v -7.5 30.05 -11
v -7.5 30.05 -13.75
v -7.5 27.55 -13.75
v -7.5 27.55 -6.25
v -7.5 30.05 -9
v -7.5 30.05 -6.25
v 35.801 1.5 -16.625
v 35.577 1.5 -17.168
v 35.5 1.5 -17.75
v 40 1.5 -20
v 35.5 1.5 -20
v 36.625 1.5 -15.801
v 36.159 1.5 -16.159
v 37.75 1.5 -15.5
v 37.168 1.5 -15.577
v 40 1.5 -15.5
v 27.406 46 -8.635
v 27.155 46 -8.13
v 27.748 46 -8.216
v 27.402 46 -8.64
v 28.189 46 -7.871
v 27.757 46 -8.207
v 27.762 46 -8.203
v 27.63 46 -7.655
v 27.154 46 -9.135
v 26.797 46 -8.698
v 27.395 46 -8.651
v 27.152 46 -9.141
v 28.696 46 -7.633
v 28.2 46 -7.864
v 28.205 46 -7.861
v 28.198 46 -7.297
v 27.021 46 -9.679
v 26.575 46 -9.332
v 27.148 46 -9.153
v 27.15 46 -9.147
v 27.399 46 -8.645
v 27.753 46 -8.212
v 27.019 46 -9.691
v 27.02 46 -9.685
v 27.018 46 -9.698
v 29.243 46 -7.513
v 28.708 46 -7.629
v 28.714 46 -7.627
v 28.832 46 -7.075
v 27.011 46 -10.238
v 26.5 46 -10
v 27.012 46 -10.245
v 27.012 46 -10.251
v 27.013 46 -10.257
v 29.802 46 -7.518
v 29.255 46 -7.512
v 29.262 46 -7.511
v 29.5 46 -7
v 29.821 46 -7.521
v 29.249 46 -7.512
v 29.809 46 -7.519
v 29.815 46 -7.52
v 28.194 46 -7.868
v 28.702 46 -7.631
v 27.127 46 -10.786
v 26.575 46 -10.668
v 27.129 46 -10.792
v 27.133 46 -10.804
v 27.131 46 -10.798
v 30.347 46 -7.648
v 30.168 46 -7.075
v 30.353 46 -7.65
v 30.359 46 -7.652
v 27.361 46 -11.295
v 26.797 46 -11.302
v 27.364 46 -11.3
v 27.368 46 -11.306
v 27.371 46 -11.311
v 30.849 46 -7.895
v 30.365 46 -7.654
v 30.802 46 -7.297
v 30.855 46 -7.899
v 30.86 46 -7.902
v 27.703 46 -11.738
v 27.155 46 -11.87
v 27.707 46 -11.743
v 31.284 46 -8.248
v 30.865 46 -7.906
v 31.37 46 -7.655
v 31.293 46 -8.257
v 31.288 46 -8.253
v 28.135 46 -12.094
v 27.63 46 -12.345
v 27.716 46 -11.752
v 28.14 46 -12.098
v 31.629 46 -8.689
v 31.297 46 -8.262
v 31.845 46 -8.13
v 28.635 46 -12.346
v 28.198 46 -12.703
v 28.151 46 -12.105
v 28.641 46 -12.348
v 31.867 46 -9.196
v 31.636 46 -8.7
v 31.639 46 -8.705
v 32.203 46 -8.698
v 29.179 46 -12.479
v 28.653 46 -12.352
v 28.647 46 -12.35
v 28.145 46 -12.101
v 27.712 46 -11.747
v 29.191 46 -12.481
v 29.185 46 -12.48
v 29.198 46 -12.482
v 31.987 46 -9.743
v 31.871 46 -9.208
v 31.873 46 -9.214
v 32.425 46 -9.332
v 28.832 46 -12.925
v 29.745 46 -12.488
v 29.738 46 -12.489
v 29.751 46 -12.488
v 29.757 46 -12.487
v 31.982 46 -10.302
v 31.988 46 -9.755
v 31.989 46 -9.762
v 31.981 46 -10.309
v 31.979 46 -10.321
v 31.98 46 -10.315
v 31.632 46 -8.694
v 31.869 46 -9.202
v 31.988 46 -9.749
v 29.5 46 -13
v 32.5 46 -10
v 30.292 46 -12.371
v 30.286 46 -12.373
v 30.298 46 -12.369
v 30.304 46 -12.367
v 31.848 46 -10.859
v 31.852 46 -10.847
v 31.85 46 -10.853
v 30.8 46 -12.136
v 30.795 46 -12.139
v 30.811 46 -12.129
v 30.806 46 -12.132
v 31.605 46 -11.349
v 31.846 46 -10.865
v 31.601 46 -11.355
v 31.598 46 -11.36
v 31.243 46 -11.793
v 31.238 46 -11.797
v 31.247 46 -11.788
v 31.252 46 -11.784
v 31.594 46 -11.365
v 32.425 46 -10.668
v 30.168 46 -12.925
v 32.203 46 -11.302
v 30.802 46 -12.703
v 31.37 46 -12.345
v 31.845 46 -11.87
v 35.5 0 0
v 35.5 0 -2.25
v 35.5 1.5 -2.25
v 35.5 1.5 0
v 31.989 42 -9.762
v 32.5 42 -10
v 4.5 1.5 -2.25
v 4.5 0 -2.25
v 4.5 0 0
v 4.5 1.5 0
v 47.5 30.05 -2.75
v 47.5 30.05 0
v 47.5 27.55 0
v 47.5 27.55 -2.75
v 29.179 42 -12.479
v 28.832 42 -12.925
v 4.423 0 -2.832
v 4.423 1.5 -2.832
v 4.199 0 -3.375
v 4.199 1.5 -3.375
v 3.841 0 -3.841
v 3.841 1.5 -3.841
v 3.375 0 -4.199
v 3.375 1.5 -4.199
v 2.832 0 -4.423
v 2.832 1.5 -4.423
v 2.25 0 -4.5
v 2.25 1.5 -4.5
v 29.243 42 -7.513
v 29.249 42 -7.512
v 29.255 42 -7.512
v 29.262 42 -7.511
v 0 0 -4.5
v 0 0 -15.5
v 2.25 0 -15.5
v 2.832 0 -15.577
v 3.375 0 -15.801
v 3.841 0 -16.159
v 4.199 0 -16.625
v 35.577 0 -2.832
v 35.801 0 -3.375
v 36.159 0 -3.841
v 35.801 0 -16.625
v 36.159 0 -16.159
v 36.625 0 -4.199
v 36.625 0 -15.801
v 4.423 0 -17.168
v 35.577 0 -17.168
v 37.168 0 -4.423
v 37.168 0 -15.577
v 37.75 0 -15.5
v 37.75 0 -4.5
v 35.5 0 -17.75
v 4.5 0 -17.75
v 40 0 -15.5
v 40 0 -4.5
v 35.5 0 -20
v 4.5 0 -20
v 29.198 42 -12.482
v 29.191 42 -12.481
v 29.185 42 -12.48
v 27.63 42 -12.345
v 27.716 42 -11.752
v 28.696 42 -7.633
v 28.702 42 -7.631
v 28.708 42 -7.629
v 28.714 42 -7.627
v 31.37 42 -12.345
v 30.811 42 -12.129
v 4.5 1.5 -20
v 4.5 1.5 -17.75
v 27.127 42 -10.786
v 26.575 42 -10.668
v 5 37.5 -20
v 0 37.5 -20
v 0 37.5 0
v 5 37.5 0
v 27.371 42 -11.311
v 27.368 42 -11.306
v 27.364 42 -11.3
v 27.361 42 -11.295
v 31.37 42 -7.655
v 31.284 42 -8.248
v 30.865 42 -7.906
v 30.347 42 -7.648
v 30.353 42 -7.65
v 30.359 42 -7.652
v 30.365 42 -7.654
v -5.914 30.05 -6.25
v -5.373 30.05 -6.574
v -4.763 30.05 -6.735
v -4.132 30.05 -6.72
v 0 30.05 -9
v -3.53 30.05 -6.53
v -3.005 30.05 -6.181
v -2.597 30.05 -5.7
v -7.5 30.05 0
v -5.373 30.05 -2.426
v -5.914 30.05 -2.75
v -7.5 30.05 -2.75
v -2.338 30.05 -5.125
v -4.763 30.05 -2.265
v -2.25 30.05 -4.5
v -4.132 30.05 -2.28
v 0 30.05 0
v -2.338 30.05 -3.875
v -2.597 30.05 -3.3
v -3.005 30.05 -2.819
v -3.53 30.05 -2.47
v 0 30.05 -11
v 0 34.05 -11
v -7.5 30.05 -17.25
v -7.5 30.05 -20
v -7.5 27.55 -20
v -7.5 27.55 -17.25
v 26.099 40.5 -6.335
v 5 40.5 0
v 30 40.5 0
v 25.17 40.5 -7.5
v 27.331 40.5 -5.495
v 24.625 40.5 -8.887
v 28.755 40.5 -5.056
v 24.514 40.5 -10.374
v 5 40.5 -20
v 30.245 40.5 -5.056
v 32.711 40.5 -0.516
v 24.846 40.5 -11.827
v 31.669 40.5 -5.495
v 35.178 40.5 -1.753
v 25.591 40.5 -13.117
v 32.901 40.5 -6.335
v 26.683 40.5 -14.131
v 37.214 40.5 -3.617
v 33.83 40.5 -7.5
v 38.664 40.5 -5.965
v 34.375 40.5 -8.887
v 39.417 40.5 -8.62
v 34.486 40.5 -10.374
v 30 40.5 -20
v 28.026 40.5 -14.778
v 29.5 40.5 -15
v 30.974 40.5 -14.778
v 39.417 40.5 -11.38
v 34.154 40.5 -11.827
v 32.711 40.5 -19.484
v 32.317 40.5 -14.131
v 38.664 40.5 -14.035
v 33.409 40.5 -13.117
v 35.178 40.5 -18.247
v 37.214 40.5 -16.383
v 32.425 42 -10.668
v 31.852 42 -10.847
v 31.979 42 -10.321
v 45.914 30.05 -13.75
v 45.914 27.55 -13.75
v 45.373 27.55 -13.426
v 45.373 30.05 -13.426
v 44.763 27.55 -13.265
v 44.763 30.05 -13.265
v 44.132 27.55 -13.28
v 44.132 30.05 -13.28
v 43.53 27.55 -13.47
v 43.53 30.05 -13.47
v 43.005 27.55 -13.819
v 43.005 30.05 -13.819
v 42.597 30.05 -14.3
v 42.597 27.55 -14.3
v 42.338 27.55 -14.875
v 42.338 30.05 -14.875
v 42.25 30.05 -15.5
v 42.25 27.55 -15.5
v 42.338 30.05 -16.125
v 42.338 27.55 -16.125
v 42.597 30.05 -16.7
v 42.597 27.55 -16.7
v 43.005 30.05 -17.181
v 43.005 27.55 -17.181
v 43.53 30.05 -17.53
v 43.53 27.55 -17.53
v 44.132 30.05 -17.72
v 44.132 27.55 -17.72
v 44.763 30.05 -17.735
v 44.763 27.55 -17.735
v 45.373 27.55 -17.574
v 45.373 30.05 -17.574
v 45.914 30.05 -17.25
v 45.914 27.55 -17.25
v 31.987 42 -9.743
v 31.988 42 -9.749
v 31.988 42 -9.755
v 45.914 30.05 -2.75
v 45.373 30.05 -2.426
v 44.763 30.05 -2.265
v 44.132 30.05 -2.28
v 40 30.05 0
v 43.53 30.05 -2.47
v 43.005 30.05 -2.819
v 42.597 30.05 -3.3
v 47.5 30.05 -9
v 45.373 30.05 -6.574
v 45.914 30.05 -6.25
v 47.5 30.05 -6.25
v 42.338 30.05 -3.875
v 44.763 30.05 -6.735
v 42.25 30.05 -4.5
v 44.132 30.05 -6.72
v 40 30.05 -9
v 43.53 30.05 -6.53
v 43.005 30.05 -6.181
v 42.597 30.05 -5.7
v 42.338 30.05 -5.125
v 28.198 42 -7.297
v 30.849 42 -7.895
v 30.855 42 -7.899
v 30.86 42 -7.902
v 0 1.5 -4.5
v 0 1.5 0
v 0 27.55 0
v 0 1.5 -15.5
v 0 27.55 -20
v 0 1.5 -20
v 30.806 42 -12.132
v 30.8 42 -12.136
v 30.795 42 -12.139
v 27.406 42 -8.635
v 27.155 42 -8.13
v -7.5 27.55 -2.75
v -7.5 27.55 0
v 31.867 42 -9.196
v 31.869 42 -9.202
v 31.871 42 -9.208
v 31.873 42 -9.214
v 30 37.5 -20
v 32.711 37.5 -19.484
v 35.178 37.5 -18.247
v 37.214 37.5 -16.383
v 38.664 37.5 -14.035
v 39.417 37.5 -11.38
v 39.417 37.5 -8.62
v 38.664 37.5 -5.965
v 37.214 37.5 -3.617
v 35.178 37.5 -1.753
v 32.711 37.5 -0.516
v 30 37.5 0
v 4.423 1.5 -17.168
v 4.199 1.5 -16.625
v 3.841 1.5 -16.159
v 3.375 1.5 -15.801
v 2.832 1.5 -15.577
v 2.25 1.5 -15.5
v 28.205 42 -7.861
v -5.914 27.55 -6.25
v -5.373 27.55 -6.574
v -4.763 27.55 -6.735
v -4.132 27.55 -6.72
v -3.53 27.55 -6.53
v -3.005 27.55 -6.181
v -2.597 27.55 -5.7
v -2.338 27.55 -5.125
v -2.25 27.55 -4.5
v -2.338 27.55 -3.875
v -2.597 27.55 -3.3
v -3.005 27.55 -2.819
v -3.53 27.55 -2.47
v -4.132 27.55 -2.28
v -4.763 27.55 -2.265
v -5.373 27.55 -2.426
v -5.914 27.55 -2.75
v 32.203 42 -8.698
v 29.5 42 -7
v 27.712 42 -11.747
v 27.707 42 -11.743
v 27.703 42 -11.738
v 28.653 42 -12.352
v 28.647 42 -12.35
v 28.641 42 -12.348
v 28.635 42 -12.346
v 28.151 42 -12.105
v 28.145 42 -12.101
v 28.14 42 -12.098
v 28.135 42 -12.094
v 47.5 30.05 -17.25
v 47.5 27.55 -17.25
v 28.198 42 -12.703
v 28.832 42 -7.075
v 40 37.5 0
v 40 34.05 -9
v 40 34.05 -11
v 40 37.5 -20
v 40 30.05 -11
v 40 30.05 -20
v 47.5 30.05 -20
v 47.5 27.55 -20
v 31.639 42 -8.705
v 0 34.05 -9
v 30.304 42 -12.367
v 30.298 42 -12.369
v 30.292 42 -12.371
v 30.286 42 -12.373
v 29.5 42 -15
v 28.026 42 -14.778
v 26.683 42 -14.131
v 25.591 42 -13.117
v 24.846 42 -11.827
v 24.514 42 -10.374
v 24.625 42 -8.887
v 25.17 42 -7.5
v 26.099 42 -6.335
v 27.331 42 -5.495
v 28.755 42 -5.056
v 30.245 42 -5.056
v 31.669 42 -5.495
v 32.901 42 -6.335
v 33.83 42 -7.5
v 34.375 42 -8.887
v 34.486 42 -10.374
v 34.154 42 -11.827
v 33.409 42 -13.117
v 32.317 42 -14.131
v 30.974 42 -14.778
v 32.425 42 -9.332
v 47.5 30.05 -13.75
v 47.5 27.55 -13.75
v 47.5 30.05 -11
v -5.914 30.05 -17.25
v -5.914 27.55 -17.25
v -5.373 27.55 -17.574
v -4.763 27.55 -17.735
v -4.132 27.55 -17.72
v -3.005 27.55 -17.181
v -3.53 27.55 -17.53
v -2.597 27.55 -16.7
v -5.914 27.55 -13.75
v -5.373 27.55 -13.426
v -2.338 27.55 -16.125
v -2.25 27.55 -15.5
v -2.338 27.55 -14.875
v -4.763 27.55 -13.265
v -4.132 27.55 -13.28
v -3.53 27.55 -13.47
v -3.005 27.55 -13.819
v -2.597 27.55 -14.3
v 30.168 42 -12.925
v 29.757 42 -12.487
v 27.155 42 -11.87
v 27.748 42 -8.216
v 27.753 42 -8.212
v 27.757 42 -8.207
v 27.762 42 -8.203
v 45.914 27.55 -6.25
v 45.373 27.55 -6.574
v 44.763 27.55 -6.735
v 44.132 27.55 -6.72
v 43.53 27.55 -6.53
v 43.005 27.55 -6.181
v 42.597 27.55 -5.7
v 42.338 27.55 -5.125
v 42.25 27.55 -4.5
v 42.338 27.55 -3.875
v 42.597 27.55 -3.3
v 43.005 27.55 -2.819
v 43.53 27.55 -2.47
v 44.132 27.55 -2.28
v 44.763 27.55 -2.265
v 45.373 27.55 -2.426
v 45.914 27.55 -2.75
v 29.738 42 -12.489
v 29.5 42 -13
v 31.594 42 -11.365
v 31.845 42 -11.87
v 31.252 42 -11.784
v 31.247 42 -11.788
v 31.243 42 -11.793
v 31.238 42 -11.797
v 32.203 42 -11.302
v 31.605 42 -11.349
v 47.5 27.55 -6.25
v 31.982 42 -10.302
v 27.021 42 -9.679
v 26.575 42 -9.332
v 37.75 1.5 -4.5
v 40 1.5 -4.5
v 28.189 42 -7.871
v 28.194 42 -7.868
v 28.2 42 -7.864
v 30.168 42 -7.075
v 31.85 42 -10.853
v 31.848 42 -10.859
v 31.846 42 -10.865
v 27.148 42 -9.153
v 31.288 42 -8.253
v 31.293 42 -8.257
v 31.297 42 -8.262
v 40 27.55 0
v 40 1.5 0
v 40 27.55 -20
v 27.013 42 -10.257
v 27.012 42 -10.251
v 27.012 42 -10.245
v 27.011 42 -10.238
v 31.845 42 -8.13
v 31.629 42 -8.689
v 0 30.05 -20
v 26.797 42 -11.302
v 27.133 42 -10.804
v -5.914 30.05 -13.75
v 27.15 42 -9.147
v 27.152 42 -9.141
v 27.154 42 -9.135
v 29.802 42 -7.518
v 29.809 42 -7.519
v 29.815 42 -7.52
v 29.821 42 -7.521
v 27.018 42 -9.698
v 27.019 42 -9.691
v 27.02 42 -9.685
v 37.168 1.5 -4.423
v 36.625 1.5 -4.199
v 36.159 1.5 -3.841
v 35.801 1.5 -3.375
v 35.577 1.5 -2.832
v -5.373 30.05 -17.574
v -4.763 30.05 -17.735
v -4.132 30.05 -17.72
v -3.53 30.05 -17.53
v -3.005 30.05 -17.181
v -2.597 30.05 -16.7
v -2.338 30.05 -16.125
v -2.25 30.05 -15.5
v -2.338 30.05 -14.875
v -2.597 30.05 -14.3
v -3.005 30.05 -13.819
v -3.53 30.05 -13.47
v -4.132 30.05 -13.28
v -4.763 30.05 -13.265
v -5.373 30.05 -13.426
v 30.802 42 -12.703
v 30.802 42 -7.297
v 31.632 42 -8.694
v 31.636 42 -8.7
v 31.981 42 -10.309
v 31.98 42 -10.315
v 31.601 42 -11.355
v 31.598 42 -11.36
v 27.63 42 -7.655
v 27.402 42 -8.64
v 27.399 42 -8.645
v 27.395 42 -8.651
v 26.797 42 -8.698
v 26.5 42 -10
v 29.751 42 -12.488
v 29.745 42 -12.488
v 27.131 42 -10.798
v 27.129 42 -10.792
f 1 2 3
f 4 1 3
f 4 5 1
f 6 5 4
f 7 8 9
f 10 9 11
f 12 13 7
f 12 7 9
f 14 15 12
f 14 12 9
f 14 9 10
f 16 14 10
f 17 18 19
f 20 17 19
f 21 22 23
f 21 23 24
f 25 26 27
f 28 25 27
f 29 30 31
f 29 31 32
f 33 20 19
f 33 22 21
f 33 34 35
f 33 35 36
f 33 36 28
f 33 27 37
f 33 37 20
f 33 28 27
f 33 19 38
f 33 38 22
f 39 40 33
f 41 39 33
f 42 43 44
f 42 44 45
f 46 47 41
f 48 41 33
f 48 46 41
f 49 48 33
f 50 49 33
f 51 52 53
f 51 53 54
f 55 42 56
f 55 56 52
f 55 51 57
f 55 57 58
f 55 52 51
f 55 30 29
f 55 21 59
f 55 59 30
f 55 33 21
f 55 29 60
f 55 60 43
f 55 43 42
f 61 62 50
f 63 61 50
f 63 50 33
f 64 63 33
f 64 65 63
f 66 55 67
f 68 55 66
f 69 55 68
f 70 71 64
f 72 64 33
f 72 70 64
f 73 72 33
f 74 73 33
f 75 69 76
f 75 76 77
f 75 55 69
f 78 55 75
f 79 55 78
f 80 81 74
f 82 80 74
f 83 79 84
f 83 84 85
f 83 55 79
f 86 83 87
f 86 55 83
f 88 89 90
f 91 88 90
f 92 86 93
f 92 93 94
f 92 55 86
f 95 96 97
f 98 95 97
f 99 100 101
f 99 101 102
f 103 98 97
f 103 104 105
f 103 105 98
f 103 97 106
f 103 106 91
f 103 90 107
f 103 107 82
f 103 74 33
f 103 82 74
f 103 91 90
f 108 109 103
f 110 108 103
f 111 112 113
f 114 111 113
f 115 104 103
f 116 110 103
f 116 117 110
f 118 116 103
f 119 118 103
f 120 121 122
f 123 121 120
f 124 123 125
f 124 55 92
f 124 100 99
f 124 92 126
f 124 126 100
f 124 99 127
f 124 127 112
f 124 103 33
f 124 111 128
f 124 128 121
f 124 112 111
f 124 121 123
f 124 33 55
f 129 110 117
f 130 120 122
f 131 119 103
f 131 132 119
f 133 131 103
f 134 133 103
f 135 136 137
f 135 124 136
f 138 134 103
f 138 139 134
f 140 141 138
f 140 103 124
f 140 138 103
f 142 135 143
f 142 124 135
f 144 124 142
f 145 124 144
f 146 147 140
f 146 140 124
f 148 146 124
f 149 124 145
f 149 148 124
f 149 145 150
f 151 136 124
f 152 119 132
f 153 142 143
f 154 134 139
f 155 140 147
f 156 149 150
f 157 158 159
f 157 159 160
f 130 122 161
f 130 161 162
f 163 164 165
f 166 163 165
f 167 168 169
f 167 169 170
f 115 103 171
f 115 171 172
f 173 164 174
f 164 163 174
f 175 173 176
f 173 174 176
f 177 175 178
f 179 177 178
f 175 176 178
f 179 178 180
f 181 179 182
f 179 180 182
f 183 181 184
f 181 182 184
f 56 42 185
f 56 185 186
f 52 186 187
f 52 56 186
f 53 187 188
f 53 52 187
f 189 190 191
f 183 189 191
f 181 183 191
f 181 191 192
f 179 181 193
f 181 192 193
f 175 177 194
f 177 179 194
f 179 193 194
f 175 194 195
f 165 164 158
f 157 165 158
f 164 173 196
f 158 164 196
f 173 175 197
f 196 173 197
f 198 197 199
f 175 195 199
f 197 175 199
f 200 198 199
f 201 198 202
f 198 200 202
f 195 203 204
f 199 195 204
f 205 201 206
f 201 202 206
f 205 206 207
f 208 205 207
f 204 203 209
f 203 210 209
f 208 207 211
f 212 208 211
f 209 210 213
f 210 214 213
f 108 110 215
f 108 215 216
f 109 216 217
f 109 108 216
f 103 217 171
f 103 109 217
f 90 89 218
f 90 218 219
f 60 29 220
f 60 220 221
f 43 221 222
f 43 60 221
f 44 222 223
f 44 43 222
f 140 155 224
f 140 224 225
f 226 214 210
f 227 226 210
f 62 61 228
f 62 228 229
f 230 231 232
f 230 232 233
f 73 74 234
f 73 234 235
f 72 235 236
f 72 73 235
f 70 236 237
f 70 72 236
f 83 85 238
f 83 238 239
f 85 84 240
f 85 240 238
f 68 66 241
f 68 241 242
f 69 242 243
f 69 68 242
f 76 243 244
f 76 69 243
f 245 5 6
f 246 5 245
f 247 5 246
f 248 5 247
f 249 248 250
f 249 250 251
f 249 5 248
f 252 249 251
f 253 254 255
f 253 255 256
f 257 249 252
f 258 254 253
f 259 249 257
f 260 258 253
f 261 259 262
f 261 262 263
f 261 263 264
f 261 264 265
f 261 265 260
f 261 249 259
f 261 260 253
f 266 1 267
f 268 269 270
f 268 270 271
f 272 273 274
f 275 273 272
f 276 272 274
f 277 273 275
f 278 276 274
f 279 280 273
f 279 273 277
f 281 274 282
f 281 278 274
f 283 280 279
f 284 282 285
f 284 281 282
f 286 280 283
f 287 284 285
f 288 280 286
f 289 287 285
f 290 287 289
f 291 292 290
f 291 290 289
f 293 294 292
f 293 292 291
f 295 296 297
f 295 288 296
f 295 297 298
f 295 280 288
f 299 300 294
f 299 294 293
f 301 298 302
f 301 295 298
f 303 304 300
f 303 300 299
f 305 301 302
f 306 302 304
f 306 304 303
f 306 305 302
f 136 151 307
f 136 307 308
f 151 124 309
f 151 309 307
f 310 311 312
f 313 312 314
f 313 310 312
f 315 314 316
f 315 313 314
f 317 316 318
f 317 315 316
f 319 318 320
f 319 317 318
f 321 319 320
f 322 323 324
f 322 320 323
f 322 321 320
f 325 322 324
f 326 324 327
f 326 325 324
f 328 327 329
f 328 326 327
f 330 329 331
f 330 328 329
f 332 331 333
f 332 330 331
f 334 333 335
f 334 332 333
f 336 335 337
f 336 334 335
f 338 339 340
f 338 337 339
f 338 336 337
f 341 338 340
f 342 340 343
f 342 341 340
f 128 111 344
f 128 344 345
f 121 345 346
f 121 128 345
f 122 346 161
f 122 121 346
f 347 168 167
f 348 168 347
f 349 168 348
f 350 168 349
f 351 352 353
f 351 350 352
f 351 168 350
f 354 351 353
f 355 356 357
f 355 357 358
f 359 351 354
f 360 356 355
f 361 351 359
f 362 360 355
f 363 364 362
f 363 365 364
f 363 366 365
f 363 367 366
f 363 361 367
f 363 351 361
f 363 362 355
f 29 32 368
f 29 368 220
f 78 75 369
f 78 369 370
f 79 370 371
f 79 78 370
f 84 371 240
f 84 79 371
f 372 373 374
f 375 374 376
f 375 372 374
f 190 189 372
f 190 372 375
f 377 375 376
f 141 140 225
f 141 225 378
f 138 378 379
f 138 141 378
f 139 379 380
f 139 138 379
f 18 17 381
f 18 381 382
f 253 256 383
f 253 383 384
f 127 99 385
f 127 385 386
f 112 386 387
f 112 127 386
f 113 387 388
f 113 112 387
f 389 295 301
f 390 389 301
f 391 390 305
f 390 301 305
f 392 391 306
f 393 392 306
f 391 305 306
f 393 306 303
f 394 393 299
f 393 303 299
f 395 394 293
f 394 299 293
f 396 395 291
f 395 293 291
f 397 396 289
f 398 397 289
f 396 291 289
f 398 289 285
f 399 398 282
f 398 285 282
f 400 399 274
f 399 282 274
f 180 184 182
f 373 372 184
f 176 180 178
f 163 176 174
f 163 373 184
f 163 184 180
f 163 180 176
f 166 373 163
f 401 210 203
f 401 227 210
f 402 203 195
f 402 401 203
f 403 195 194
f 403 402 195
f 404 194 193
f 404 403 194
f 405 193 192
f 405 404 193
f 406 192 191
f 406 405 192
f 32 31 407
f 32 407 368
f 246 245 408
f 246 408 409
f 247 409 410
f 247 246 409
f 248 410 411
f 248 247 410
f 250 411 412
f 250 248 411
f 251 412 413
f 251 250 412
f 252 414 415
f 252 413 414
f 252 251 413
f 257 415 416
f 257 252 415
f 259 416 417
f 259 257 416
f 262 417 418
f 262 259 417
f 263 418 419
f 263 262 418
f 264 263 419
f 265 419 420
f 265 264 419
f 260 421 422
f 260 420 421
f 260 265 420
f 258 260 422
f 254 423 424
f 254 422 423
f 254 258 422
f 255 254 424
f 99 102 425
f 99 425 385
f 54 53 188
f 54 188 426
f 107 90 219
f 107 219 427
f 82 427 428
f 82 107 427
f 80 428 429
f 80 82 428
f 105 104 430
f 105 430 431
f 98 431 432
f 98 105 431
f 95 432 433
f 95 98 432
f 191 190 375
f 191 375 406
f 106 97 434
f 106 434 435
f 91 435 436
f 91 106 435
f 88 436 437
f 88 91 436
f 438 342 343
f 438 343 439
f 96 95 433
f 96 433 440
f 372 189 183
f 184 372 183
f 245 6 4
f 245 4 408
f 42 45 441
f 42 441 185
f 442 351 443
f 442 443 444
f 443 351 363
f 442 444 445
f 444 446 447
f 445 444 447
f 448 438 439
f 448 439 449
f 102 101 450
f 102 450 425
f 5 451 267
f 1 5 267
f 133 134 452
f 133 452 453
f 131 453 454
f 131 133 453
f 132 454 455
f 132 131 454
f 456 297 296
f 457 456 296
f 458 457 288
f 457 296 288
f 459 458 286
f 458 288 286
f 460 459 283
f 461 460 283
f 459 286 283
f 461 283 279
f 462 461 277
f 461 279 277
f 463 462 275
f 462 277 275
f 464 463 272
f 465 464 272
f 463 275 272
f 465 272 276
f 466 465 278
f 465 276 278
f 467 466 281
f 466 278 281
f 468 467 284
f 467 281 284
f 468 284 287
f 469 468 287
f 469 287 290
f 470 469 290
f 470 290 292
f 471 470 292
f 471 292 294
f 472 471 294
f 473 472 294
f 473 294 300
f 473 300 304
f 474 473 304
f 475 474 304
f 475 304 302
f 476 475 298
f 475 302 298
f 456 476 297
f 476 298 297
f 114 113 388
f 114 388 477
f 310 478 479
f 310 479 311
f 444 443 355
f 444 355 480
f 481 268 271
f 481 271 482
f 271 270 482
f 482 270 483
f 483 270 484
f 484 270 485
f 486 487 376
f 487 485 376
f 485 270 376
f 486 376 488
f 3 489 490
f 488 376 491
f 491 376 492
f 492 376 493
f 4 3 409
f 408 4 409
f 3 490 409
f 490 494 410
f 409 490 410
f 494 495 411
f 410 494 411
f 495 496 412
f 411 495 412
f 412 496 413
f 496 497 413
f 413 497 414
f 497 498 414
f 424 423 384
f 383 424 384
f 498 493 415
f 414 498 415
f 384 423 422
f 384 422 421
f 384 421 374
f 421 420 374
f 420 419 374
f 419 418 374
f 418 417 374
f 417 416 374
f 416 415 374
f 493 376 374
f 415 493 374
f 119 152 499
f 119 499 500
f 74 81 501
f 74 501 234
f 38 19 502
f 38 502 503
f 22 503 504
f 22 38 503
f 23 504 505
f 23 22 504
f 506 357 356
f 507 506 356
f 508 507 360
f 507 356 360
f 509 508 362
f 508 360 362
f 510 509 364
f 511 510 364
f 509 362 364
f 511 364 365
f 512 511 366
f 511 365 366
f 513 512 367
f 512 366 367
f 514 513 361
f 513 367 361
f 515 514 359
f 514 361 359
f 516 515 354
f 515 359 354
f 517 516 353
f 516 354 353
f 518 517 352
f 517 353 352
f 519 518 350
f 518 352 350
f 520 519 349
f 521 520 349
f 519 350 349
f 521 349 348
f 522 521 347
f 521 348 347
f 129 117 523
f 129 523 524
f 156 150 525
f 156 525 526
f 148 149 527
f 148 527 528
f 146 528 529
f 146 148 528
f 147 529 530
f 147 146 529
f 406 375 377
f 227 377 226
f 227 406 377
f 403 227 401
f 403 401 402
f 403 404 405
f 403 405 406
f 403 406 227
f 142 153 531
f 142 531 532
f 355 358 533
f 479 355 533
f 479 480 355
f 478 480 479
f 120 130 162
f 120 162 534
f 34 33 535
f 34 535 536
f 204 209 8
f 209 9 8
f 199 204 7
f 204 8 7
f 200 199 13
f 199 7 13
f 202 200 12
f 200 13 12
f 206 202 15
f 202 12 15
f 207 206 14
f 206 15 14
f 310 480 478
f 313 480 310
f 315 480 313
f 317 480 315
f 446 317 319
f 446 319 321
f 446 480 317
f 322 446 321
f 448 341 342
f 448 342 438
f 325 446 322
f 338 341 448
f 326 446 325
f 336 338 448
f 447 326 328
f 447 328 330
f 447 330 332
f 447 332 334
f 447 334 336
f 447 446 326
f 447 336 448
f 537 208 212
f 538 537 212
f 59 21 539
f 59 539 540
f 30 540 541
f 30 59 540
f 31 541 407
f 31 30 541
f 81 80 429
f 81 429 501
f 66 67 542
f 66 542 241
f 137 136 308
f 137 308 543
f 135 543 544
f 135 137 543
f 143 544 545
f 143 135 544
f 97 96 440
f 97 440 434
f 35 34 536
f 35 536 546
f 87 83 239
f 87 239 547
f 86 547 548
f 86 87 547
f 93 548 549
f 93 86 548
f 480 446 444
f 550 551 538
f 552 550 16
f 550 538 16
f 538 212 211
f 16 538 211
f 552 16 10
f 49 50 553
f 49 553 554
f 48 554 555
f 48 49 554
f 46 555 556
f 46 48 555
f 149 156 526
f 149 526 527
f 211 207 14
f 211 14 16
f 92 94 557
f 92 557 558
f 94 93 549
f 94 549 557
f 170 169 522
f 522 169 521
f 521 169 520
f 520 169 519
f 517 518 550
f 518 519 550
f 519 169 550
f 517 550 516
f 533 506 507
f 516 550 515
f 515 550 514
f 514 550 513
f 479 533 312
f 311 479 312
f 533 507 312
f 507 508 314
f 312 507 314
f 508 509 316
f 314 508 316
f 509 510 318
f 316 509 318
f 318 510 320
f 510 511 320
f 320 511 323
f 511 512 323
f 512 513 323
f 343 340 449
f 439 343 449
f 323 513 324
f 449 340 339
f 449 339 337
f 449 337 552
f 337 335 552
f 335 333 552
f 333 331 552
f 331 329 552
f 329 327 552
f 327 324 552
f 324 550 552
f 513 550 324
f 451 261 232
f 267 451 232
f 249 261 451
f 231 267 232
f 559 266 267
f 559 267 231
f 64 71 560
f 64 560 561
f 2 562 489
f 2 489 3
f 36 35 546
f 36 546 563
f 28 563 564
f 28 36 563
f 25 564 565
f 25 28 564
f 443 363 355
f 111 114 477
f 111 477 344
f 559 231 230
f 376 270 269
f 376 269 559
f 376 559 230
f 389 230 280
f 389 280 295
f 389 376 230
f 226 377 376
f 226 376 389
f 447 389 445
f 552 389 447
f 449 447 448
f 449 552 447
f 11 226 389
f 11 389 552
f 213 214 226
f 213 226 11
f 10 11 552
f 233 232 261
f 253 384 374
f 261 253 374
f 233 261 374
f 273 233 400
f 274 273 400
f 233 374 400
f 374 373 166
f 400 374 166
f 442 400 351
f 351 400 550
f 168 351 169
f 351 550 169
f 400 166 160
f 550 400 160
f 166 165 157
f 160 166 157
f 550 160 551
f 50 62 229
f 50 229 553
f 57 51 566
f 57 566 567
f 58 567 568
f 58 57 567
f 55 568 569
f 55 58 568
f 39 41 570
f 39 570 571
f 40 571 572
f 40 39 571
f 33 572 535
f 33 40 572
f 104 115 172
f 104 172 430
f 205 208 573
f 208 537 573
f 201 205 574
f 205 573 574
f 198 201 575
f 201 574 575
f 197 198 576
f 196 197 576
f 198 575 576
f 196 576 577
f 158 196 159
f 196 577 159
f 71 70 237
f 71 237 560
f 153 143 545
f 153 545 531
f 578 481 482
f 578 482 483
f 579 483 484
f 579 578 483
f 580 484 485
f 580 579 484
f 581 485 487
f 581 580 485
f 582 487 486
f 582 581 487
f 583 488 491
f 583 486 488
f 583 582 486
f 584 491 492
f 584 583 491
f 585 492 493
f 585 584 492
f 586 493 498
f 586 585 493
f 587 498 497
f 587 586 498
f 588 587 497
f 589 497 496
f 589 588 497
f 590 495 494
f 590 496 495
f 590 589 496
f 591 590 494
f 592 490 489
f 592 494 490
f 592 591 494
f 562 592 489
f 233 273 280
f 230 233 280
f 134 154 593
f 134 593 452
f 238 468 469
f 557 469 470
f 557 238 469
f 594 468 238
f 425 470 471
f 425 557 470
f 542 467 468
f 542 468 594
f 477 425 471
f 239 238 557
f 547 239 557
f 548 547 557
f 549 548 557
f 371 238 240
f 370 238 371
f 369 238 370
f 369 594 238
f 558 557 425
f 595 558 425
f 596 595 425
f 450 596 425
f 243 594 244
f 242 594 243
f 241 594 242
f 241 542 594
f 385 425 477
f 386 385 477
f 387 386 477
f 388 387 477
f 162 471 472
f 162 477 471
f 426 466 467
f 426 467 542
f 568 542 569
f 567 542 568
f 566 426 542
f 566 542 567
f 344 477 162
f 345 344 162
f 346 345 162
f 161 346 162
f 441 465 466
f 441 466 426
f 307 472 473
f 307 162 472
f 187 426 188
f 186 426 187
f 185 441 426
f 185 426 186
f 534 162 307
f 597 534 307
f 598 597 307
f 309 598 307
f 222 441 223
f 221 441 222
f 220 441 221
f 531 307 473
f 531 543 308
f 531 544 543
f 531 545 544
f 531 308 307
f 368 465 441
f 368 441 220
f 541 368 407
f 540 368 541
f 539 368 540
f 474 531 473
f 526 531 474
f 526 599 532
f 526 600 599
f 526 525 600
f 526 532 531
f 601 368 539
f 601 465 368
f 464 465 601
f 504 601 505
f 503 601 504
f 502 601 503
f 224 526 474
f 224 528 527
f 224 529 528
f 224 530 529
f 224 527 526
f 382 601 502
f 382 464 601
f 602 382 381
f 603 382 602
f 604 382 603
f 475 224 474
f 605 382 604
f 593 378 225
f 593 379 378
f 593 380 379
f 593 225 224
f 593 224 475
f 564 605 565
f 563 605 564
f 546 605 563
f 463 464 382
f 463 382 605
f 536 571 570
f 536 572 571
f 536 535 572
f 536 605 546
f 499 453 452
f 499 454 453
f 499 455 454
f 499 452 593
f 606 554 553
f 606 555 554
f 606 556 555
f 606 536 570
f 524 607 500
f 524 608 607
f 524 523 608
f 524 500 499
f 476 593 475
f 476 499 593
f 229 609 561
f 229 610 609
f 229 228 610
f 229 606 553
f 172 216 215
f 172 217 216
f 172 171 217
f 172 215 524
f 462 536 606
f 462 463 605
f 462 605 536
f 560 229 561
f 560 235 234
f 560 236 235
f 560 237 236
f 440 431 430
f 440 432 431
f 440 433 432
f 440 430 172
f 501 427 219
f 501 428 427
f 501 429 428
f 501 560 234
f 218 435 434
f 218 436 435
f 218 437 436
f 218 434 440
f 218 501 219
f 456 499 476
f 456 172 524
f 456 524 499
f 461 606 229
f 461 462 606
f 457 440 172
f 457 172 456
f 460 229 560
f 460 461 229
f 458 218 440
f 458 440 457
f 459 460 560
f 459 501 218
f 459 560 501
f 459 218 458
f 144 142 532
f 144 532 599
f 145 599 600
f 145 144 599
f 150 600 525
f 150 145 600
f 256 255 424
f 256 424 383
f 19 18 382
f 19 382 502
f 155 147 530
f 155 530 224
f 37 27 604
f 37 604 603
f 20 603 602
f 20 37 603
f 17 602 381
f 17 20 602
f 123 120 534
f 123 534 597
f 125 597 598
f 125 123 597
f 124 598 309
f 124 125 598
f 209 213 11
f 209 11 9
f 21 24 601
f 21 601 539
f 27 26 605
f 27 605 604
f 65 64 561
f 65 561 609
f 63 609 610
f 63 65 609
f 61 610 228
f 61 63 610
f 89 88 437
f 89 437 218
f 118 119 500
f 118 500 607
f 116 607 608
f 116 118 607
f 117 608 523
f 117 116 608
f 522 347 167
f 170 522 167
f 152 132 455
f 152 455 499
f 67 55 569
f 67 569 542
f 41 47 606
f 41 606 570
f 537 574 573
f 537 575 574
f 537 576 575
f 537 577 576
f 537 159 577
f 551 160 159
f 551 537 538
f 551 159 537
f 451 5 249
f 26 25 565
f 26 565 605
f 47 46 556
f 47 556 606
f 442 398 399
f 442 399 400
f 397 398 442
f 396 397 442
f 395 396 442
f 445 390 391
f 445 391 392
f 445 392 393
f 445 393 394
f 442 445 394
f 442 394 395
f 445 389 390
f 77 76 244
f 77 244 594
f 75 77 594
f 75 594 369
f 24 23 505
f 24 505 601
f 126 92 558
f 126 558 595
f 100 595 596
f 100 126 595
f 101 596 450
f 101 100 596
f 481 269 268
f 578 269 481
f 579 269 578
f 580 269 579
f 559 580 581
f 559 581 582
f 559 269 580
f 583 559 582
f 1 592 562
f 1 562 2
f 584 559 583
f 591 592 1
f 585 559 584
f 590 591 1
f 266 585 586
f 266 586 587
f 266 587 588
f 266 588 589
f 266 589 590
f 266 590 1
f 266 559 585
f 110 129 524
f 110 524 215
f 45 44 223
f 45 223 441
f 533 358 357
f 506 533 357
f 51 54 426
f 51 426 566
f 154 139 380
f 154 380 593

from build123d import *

# Parameters (mm, degrees)
SKETCH1_W           = 40
SKETCH1_H           = 20
BOSS_EXTRUDE1_DEPTH = 40.5
SKETCH2_R           = 5
BOSS_EXTRUDE2_DEPTH = 1.5
SKETCH3_W           = 20
SKETCH3_H           = 2.5
BOSS_EXTRUDE3_DEPTH = 7.5
SKETCH4_W           = 20
SKETCH4_H           = 2.5
BOSS_EXTRUDE4_DEPTH = 7.5
SKETCH5_W           = 5
SKETCH5_H           = 20
CUT_EXTRUDE1_DEPTH  = 3
SKETCH6_R           = 3
BOSS_EXTRUDE5_DEPTH = 4
SKETCH7_OUTSIDE_W   = 71.888
SKETCH7_OUTSIDE_H   = 36.888
CUT_EXTRUDE2_DEPTH  = 4
BOSS_EXTRUDE6_START = 4
SKETCH8_R           = 2.500178688
BOSS_EXTRUDE6_DEPTH = 4
SKETCH9_W           = 7.5
SKETCH9_H           = 2
BOSS_EXTRUDE7_DEPTH = 4
CHAMFER1_SIZE2      = 7.5
CHAMFER1_SIZE       = 4
CHAMFER2_SIZE2      = 7.5
CHAMFER2_SIZE       = 4
CUT_EXTRUDE3_REACH  = 61.659
SKETCH11_W          = 4.5
SKETCH11_H          = 4.5
CUT_EXTRUDE4_DEPTH  = 1.5
FILLET1_R           = 2.25


with BuildPart() as part:
    # Sketch1 → Boss-Extrude1 (new body)
    with BuildSketch(Plane(origin=(0, 0, 0), x_dir=(1, 0, 0), z_dir=(0, 1, 0))):
        with Locations((20, 10)):
            Rectangle(SKETCH1_W, SKETCH1_H)
    extrude(amount=BOSS_EXTRUDE1_DEPTH)

    # Sketch2 → Boss-Extrude2 (add)
    with BuildSketch(Plane(origin=(0, 40.5, 0), x_dir=(1, 0, 0), z_dir=(0, 1, 0))):
        with Locations(Location((29.5, 10, 0), (0, 0, 90))):
            Circle(SKETCH2_R)
    extrude(amount=BOSS_EXTRUDE2_DEPTH)

    # Sketch3 → Boss-Extrude3 (add)
    with BuildSketch(Plane(origin=(40, 0, 0), x_dir=(0, 0, -1), z_dir=(1, 0, 0))):
        with Locations((10, 28.8)):
            Rectangle(SKETCH3_W, SKETCH3_H)
    extrude(amount=BOSS_EXTRUDE3_DEPTH)

    # Sketch4 → Boss-Extrude4 (add)
    with BuildSketch(Plane.ZY):
        with Locations((-10, 28.8)):
            Rectangle(SKETCH4_W, SKETCH4_H)
    extrude(amount=BOSS_EXTRUDE4_DEPTH)

    # Sketch5 → Cut-Extrude1 (cut)
    with BuildSketch(Plane(origin=(0, 40.5, 0), x_dir=(1, 0, 0), z_dir=(0, 1, 0))):
        with Locations((2.5, 10)):
            Rectangle(SKETCH5_W, SKETCH5_H)
        with BuildLine():
            Line((30, 0), (40, 0))
            Line((40, 0), (40, 20))
            Line((40, 20), (30, 20))
            ThreePointArc((30, 20), (39.512492197, 10), (30, 0))
        make_face()
    extrude(amount=-CUT_EXTRUDE1_DEPTH, mode=Mode.SUBTRACT)

    # Sketch6 → Boss-Extrude5 (add)
    with BuildSketch(Plane(origin=(0, 42, 0), x_dir=(1, 0, 0), z_dir=(0, 1, 0))):
        with Locations(Location((29.5, 10, 0), (0, 0, 270))):
            Circle(SKETCH6_R)
    extrude(amount=BOSS_EXTRUDE5_DEPTH)

    # Sketch7 outside → Cut-Extrude2 (cut)
    with BuildSketch(Plane(origin=(0, 46, 0), x_dir=(1, 0, 0), z_dir=(0, 1, 0))):
        with Locations((20, 10)):
            Rectangle(SKETCH7_OUTSIDE_W, SKETCH7_OUTSIDE_H)
        with BuildLine():
            Line((29.5, 13), (29.197535282, 12.481815579))
            ThreePointArc((29.197535282, 12.481815579), (29.467797841, 12.499971299), (29.738438382, 12.488782958))
            Line((29.738438382, 12.488782958), (29.5, 13))
        make_face(mode=Mode.SUBTRACT)
        with BuildLine():
            Line((30.167562802, 12.924783737), (29.757374624, 12.486896012))
            ThreePointArc((29.757374624, 12.486896012), (30.024901165, 12.444457453), (30.286266542, 12.373326442))
            Line((30.286266542, 12.373326442), (30.167562802, 12.924783737))
        make_face(mode=Mode.SUBTRACT)
        with BuildLine():
            Line((30.801651217, 12.702906604), (30.304308129, 12.367273095))
            ThreePointArc((30.304308129, 12.367273095), (30.555683752, 12.266368304), (30.794668015, 12.138861427))
            Line((30.794668015, 12.138861427), (30.801651217, 12.702906604))
        make_face(mode=Mode.SUBTRACT)
        with BuildLine():
            Line((31.370469406, 12.345494447), (30.810910265, 12.12894522))
            ThreePointArc((30.810910265, 12.12894522), (31.033529948, 11.974633984), (31.238149427, 11.79714497))
            Line((31.238149427, 11.79714497), (31.370469406, 12.345494447))
        make_face(mode=Mode.SUBTRACT)
        with BuildLine():
            Line((31.845494447, 11.870469406), (31.251777886, 11.783863142))
            ThreePointArc((31.251777886, 11.783863142), (31.434478549, 11.583883271), (31.594472769, 11.36531216))
            Line((31.594472769, 11.36531216), (31.845494447, 11.870469406))
        make_face(mode=Mode.SUBTRACT)
        with BuildLine():
            Line((32.202906604, 11.301651217), (31.60480405, 11.349330718))
            ThreePointArc((31.60480405, 11.349330718), (31.738424318, 11.113710037), (31.845770501, 10.865016897))
            Line((31.845770501, 10.865016897), (32.202906604, 11.301651217))
        make_face(mode=Mode.SUBTRACT)
        with BuildLine():
            Line((32.424783737, 10.667562802), (31.852286549, 10.847137217))
            ThreePointArc((31.852286549, 10.847137217), (31.930126144, 10.587690732), (31.979441504, 10.321346074))
            Line((31.979441504, 10.321346074), (32.424783737, 10.667562802))
        make_face(mode=Mode.SUBTRACT)
        with BuildLine():
            Line((32.5, 10), (31.981815579, 10.302464718))
            ThreePointArc((31.981815579, 10.302464718), (31.999971299, 10.032202159), (31.988782958, 9.761561618))
            Line((31.988782958, 9.761561618), (32.5, 10))
        make_face(mode=Mode.SUBTRACT)
        with BuildLine():
            Line((32.424783737, 9.332437198), (31.986896012, 9.742625376))
            ThreePointArc((31.986896012, 9.742625376), (31.944457453, 9.475098835), (31.873326442, 9.213733458))
            Line((31.873326442, 9.213733458), (32.424783737, 9.332437198))
        make_face(mode=Mode.SUBTRACT)
        with BuildLine():
            Line((32.202906604, 8.698348783), (31.867273095, 9.195691871))
            ThreePointArc((31.867273095, 9.195691871), (31.766368304, 8.944316248), (31.638861427, 8.705331985))
            Line((31.638861427, 8.705331985), (32.202906604, 8.698348783))
        make_face(mode=Mode.SUBTRACT)
        with BuildLine():
            Line((31.845494447, 8.129530594), (31.62894522, 8.689089735))
            ThreePointArc((31.62894522, 8.689089735), (31.474633984, 8.466470052), (31.29714497, 8.261850573))
            Line((31.29714497, 8.261850573), (31.845494447, 8.129530594))
        make_face(mode=Mode.SUBTRACT)
        with BuildLine():
            Line((31.370469406, 7.654505553), (31.283863142, 8.248222114))
            ThreePointArc((31.283863142, 8.248222114), (31.083883271, 8.065521451), (30.86531216, 7.905527231))
            Line((30.86531216, 7.905527231), (31.370469406, 7.654505553))
        make_face(mode=Mode.SUBTRACT)
        with BuildLine():
            Line((30.801651217, 7.297093396), (30.849330718, 7.89519595))
            ThreePointArc((30.849330718, 7.89519595), (30.613710037, 7.761575682), (30.365016897, 7.654229499))
            Line((30.365016897, 7.654229499), (30.801651217, 7.297093396))
        make_face(mode=Mode.SUBTRACT)
        with BuildLine():
            Line((30.167562802, 7.075216263), (30.347137217, 7.647713451))
            ThreePointArc((30.347137217, 7.647713451), (30.087690732, 7.569873856), (29.821346074, 7.520558496))
            Line((29.821346074, 7.520558496), (30.167562802, 7.075216263))
        make_face(mode=Mode.SUBTRACT)
        with BuildLine():
            Line((29.5, 7), (29.802464718, 7.518184421))
            ThreePointArc((29.802464718, 7.518184421), (29.532202159, 7.500028701), (29.261561618, 7.511217042))
            Line((29.261561618, 7.511217042), (29.5, 7))
        make_face(mode=Mode.SUBTRACT)
        with BuildLine():
            Line((28.832437198, 7.075216263), (29.242625376, 7.513103988))
            ThreePointArc((29.242625376, 7.513103988), (28.975098835, 7.555542547), (28.713733458, 7.626673558))
            Line((28.713733458, 7.626673558), (28.832437198, 7.075216263))
        make_face(mode=Mode.SUBTRACT)
        with BuildLine():
            Line((28.198348783, 7.297093396), (28.695691871, 7.632726905))
            ThreePointArc((28.695691871, 7.632726905), (28.444316248, 7.733631696), (28.205331985, 7.861138573))
            Line((28.205331985, 7.861138573), (28.198348783, 7.297093396))
        make_face(mode=Mode.SUBTRACT)
        with BuildLine():
            Line((27.629530594, 7.654505553), (28.189089735, 7.87105478))
            ThreePointArc((28.189089735, 7.87105478), (27.966470052, 8.025366016), (27.761850573, 8.20285503))
            Line((27.761850573, 8.20285503), (27.629530594, 7.654505553))
        make_face(mode=Mode.SUBTRACT)
        with BuildLine():
            Line((27.154505553, 8.129530594), (27.748222114, 8.216136858))
            ThreePointArc((27.748222114, 8.216136858), (27.565521451, 8.416116729), (27.405527231, 8.63468784))
            Line((27.405527231, 8.63468784), (27.154505553, 8.129530594))
        make_face(mode=Mode.SUBTRACT)
        with BuildLine():
            Line((26.797093396, 8.698348783), (27.39519595, 8.650669282))
            ThreePointArc((27.39519595, 8.650669282), (27.261575682, 8.886289963), (27.154229499, 9.134983103))
            Line((27.154229499, 9.134983103), (26.797093396, 8.698348783))
        make_face(mode=Mode.SUBTRACT)
        with BuildLine():
            Line((26.575216263, 9.332437198), (27.147713451, 9.152862783))
            ThreePointArc((27.147713451, 9.152862783), (27.069873856, 9.412309268), (27.020558496, 9.678653926))
            Line((27.020558496, 9.678653926), (26.575216263, 9.332437198))
        make_face(mode=Mode.SUBTRACT)
        with BuildLine():
            Line((26.5, 10), (27.018184421, 9.697535282))
            ThreePointArc((27.018184421, 9.697535282), (27.000028701, 9.967797841), (27.011217042, 10.238438382))
            Line((27.011217042, 10.238438382), (26.5, 10))
        make_face(mode=Mode.SUBTRACT)
        with BuildLine():
            Line((26.575216263, 10.667562802), (27.013103988, 10.257374624))
            ThreePointArc((27.013103988, 10.257374624), (27.055542547, 10.524901165), (27.126673558, 10.786266542))
            Line((27.126673558, 10.786266542), (26.575216263, 10.667562802))
        make_face(mode=Mode.SUBTRACT)
        with BuildLine():
            Line((26.797093396, 11.301651217), (27.132726905, 10.804308129))
            ThreePointArc((27.132726905, 10.804308129), (27.233631696, 11.055683752), (27.361138573, 11.294668015))
            Line((27.361138573, 11.294668015), (26.797093396, 11.301651217))
        make_face(mode=Mode.SUBTRACT)
        with BuildLine():
            Line((27.154505553, 11.870469406), (27.37105478, 11.310910265))
            ThreePointArc((27.37105478, 11.310910265), (27.525366016, 11.533529948), (27.70285503, 11.738149427))
            Line((27.70285503, 11.738149427), (27.154505553, 11.870469406))
        make_face(mode=Mode.SUBTRACT)
        with BuildLine():
            Line((27.629530594, 12.345494447), (27.716136858, 11.751777886))
            ThreePointArc((27.716136858, 11.751777886), (27.916116729, 11.934478549), (28.13468784, 12.094472769))
            Line((28.13468784, 12.094472769), (27.629530594, 12.345494447))
        make_face(mode=Mode.SUBTRACT)
        with BuildLine():
            Line((28.198348783, 12.702906604), (28.150669282, 12.10480405))
            ThreePointArc((28.150669282, 12.10480405), (28.386289963, 12.238424318), (28.634983103, 12.345770501))
            Line((28.634983103, 12.345770501), (28.198348783, 12.702906604))
        make_face(mode=Mode.SUBTRACT)
        with BuildLine():
            Line((28.832437198, 12.924783737), (28.652862783, 12.352286549))
            ThreePointArc((28.652862783, 12.352286549), (28.912309268, 12.430126144), (29.178653926, 12.479441504))
            Line((29.178653926, 12.479441504), (28.832437198, 12.924783737))
        make_face(mode=Mode.SUBTRACT)
    extrude(amount=-CUT_EXTRUDE2_DEPTH, mode=Mode.SUBTRACT)

    # Sketch8 → Boss-Extrude6 (add)
    with BuildSketch(Plane(origin=(0, 42, 0), x_dir=(1, 0, 0), z_dir=(0, 1, 0)).offset(BOSS_EXTRUDE6_START)):
        with Locations((29.5, 10)):
            Circle(SKETCH8_R)
    extrude(amount=-BOSS_EXTRUDE6_DEPTH)

    # Sketch9 → Boss-Extrude7 (add)
    with BuildSketch(Plane(origin=(0, 30.05, 0), x_dir=(1, 0, 0), z_dir=(0, 1, 0))):
        with Locations((-3.75, 10)):
            Rectangle(SKETCH9_W, SKETCH9_H)
        with Locations((43.75, 10)):
            Rectangle(SKETCH9_W, SKETCH9_H)
    extrude(amount=BOSS_EXTRUDE7_DEPTH)

    # Chamfer1
    chamfer1_edges = [part.edges().sort_by_distance(p)[0] for p in [
        (-7.5, 34.05, -10),
    ]]
    chamfer1_side = [part.faces().sort_by_distance(p)[0] for p in [
        (-7.5, 33.97, -10),
    ]]
    chamfer(chamfer1_edges, length=CHAMFER1_SIZE - 0.0001, length2=CHAMFER1_SIZE2 - 0.0001, reference=chamfer1_side[0])  # a hair under: the kernel refuses the full size

    # Chamfer2
    chamfer2_edges = [part.edges().sort_by_distance(p)[0] for p in [
        (47.5, 34.05, -10),
    ]]
    chamfer2_side = [part.faces().sort_by_distance(p)[0] for p in [
        (47.5, 33.97, -10),
    ]]
    chamfer(chamfer2_edges, length=CHAMFER2_SIZE - 0.0001, length2=CHAMFER2_SIZE2 - 0.0001, reference=chamfer2_side[0])  # a hair under: the kernel refuses the full size

    # Sketch10 → Cut-Extrude3 (cut, up to next)
    with BuildSketch(Plane(origin=(0, 30.05, 0), x_dir=(1, 0, 0), z_dir=(0, 1, 0)), mode=Mode.PRIVATE) as cut_extrude3_sk1:
        with BuildLine():
            Line((45.914213562, 17.25), (47.5, 17.25))
            Line((47.5, 17.25), (47.5, 13.75))
            Line((47.5, 13.75), (45.914213562, 13.75))
            ThreePointArc((45.914213562, 13.75), (42.25, 15.5), (45.914213562, 17.25))
        make_face()
    cut_extrude3_tool1 = extrude(cut_extrude3_sk1.sketch, amount=-CUT_EXTRUDE3_REACH, mode=Mode.PRIVATE) & part.part
    # Sketch10 → Cut-Extrude3 (cut, up to next)
    with BuildSketch(Plane(origin=(0, 30.05, 0), x_dir=(1, 0, 0), z_dir=(0, 1, 0)), mode=Mode.PRIVATE) as cut_extrude3_sk2:
        with BuildLine():
            Line((45.914213562, 2.75), (47.5, 2.75))
            Line((47.5, 2.75), (47.5, 6.25))
            Line((47.5, 6.25), (45.914213562, 6.25))
            ThreePointArc((45.914213562, 6.25), (42.25, 4.5), (45.914213562, 2.75))
        make_face()
    cut_extrude3_tool2 = extrude(cut_extrude3_sk2.sketch, amount=-CUT_EXTRUDE3_REACH, mode=Mode.PRIVATE) & part.part
    # Sketch10 → Cut-Extrude3 (cut, up to next)
    with BuildSketch(Plane(origin=(0, 30.05, 0), x_dir=(1, 0, 0), z_dir=(0, 1, 0)), mode=Mode.PRIVATE) as cut_extrude3_sk3:
        with BuildLine():
            Line((-5.914213562, 13.75), (-7.5, 13.75))
            Line((-7.5, 13.75), (-7.5, 17.25))
            Line((-7.5, 17.25), (-5.914213562, 17.25))
            ThreePointArc((-5.914213562, 17.25), (-2.25, 15.5), (-5.914213562, 13.75))
        make_face()
    cut_extrude3_tool3 = extrude(cut_extrude3_sk3.sketch, amount=-CUT_EXTRUDE3_REACH, mode=Mode.PRIVATE) & part.part
    # Sketch10 → Cut-Extrude3 (cut, up to next)
    with BuildSketch(Plane(origin=(0, 30.05, 0), x_dir=(1, 0, 0), z_dir=(0, 1, 0)), mode=Mode.PRIVATE) as cut_extrude3_sk4:
        with BuildLine():
            Line((-5.914213562, 2.75), (-7.5, 2.75))
            Line((-7.5, 2.75), (-7.5, 6.25))
            Line((-7.5, 6.25), (-5.914213562, 6.25))
            ThreePointArc((-5.914213562, 6.25), (-2.25, 4.5), (-5.914213562, 2.75))
        make_face()
    cut_extrude3_tool4 = extrude(cut_extrude3_sk4.sketch, amount=-CUT_EXTRUDE3_REACH, mode=Mode.PRIVATE) & part.part
    add(cut_extrude3_tool1.solids().sort_by_distance((44.946855, 30.05, -15.5))[0], mode=Mode.SUBTRACT)
    add(cut_extrude3_tool2.solids().sort_by_distance((44.946855, 30.05, -4.5))[0], mode=Mode.SUBTRACT)
    add(cut_extrude3_tool3.solids().sort_by_distance((-4.946855, 30.05, -15.5))[0], mode=Mode.SUBTRACT)
    add(cut_extrude3_tool4.solids().sort_by_distance((-4.946855, 30.05, -4.5))[0], mode=Mode.SUBTRACT)

    # Sketch11 → Cut-Extrude4 (cut)
    with BuildSketch(Plane.XZ):
        with Locations((2.25, -2.25)):
            Rectangle(SKETCH11_W, SKETCH11_H)
        with Locations((37.75, -2.25)):
            Rectangle(SKETCH11_W, SKETCH11_H)
        with Locations((2.25, -17.75)):
            Rectangle(SKETCH11_W, SKETCH11_H)
        with Locations((37.75, -17.75)):
            Rectangle(SKETCH11_W, SKETCH11_H)
    extrude(amount=-CUT_EXTRUDE4_DEPTH, mode=Mode.SUBTRACT)

    # Fillet1
    fillet1_edges = [part.edges().sort_by_distance(p)[0] for p in [
        (35.5, 0.75, -4.5),
        (4.5, 0.75, -15.5),
        (35.5, 0.75, -15.5),
        (4.5, 0.75, -4.5),
    ]]
    fillet(fillet1_edges, radius=FILLET1_R)


solid = part.part
